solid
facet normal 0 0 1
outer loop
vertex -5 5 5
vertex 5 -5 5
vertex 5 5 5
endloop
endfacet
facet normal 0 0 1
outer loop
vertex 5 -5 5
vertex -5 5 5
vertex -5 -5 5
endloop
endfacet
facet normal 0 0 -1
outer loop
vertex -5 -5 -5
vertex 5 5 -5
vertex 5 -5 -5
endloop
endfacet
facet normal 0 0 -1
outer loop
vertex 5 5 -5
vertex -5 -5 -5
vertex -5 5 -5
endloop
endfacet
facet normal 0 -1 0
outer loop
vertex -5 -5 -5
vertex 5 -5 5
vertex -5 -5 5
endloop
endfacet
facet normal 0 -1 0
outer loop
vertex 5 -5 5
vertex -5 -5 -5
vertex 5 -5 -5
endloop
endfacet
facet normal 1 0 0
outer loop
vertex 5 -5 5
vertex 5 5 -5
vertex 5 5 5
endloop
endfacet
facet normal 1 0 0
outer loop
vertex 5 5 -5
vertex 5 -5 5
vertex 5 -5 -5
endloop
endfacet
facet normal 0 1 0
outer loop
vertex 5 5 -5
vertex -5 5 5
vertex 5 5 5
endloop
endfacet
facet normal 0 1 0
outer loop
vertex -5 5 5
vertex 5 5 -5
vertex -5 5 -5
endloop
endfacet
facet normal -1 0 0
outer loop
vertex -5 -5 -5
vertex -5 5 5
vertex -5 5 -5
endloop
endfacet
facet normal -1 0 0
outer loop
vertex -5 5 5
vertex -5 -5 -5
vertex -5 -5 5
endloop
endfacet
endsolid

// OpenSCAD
// Ultra-simple test to verify OpenSCAD is rendering correctly
// This should show a green cube, not a yellow sphere

color("green")
cube([10, 10, 10], center=true);
